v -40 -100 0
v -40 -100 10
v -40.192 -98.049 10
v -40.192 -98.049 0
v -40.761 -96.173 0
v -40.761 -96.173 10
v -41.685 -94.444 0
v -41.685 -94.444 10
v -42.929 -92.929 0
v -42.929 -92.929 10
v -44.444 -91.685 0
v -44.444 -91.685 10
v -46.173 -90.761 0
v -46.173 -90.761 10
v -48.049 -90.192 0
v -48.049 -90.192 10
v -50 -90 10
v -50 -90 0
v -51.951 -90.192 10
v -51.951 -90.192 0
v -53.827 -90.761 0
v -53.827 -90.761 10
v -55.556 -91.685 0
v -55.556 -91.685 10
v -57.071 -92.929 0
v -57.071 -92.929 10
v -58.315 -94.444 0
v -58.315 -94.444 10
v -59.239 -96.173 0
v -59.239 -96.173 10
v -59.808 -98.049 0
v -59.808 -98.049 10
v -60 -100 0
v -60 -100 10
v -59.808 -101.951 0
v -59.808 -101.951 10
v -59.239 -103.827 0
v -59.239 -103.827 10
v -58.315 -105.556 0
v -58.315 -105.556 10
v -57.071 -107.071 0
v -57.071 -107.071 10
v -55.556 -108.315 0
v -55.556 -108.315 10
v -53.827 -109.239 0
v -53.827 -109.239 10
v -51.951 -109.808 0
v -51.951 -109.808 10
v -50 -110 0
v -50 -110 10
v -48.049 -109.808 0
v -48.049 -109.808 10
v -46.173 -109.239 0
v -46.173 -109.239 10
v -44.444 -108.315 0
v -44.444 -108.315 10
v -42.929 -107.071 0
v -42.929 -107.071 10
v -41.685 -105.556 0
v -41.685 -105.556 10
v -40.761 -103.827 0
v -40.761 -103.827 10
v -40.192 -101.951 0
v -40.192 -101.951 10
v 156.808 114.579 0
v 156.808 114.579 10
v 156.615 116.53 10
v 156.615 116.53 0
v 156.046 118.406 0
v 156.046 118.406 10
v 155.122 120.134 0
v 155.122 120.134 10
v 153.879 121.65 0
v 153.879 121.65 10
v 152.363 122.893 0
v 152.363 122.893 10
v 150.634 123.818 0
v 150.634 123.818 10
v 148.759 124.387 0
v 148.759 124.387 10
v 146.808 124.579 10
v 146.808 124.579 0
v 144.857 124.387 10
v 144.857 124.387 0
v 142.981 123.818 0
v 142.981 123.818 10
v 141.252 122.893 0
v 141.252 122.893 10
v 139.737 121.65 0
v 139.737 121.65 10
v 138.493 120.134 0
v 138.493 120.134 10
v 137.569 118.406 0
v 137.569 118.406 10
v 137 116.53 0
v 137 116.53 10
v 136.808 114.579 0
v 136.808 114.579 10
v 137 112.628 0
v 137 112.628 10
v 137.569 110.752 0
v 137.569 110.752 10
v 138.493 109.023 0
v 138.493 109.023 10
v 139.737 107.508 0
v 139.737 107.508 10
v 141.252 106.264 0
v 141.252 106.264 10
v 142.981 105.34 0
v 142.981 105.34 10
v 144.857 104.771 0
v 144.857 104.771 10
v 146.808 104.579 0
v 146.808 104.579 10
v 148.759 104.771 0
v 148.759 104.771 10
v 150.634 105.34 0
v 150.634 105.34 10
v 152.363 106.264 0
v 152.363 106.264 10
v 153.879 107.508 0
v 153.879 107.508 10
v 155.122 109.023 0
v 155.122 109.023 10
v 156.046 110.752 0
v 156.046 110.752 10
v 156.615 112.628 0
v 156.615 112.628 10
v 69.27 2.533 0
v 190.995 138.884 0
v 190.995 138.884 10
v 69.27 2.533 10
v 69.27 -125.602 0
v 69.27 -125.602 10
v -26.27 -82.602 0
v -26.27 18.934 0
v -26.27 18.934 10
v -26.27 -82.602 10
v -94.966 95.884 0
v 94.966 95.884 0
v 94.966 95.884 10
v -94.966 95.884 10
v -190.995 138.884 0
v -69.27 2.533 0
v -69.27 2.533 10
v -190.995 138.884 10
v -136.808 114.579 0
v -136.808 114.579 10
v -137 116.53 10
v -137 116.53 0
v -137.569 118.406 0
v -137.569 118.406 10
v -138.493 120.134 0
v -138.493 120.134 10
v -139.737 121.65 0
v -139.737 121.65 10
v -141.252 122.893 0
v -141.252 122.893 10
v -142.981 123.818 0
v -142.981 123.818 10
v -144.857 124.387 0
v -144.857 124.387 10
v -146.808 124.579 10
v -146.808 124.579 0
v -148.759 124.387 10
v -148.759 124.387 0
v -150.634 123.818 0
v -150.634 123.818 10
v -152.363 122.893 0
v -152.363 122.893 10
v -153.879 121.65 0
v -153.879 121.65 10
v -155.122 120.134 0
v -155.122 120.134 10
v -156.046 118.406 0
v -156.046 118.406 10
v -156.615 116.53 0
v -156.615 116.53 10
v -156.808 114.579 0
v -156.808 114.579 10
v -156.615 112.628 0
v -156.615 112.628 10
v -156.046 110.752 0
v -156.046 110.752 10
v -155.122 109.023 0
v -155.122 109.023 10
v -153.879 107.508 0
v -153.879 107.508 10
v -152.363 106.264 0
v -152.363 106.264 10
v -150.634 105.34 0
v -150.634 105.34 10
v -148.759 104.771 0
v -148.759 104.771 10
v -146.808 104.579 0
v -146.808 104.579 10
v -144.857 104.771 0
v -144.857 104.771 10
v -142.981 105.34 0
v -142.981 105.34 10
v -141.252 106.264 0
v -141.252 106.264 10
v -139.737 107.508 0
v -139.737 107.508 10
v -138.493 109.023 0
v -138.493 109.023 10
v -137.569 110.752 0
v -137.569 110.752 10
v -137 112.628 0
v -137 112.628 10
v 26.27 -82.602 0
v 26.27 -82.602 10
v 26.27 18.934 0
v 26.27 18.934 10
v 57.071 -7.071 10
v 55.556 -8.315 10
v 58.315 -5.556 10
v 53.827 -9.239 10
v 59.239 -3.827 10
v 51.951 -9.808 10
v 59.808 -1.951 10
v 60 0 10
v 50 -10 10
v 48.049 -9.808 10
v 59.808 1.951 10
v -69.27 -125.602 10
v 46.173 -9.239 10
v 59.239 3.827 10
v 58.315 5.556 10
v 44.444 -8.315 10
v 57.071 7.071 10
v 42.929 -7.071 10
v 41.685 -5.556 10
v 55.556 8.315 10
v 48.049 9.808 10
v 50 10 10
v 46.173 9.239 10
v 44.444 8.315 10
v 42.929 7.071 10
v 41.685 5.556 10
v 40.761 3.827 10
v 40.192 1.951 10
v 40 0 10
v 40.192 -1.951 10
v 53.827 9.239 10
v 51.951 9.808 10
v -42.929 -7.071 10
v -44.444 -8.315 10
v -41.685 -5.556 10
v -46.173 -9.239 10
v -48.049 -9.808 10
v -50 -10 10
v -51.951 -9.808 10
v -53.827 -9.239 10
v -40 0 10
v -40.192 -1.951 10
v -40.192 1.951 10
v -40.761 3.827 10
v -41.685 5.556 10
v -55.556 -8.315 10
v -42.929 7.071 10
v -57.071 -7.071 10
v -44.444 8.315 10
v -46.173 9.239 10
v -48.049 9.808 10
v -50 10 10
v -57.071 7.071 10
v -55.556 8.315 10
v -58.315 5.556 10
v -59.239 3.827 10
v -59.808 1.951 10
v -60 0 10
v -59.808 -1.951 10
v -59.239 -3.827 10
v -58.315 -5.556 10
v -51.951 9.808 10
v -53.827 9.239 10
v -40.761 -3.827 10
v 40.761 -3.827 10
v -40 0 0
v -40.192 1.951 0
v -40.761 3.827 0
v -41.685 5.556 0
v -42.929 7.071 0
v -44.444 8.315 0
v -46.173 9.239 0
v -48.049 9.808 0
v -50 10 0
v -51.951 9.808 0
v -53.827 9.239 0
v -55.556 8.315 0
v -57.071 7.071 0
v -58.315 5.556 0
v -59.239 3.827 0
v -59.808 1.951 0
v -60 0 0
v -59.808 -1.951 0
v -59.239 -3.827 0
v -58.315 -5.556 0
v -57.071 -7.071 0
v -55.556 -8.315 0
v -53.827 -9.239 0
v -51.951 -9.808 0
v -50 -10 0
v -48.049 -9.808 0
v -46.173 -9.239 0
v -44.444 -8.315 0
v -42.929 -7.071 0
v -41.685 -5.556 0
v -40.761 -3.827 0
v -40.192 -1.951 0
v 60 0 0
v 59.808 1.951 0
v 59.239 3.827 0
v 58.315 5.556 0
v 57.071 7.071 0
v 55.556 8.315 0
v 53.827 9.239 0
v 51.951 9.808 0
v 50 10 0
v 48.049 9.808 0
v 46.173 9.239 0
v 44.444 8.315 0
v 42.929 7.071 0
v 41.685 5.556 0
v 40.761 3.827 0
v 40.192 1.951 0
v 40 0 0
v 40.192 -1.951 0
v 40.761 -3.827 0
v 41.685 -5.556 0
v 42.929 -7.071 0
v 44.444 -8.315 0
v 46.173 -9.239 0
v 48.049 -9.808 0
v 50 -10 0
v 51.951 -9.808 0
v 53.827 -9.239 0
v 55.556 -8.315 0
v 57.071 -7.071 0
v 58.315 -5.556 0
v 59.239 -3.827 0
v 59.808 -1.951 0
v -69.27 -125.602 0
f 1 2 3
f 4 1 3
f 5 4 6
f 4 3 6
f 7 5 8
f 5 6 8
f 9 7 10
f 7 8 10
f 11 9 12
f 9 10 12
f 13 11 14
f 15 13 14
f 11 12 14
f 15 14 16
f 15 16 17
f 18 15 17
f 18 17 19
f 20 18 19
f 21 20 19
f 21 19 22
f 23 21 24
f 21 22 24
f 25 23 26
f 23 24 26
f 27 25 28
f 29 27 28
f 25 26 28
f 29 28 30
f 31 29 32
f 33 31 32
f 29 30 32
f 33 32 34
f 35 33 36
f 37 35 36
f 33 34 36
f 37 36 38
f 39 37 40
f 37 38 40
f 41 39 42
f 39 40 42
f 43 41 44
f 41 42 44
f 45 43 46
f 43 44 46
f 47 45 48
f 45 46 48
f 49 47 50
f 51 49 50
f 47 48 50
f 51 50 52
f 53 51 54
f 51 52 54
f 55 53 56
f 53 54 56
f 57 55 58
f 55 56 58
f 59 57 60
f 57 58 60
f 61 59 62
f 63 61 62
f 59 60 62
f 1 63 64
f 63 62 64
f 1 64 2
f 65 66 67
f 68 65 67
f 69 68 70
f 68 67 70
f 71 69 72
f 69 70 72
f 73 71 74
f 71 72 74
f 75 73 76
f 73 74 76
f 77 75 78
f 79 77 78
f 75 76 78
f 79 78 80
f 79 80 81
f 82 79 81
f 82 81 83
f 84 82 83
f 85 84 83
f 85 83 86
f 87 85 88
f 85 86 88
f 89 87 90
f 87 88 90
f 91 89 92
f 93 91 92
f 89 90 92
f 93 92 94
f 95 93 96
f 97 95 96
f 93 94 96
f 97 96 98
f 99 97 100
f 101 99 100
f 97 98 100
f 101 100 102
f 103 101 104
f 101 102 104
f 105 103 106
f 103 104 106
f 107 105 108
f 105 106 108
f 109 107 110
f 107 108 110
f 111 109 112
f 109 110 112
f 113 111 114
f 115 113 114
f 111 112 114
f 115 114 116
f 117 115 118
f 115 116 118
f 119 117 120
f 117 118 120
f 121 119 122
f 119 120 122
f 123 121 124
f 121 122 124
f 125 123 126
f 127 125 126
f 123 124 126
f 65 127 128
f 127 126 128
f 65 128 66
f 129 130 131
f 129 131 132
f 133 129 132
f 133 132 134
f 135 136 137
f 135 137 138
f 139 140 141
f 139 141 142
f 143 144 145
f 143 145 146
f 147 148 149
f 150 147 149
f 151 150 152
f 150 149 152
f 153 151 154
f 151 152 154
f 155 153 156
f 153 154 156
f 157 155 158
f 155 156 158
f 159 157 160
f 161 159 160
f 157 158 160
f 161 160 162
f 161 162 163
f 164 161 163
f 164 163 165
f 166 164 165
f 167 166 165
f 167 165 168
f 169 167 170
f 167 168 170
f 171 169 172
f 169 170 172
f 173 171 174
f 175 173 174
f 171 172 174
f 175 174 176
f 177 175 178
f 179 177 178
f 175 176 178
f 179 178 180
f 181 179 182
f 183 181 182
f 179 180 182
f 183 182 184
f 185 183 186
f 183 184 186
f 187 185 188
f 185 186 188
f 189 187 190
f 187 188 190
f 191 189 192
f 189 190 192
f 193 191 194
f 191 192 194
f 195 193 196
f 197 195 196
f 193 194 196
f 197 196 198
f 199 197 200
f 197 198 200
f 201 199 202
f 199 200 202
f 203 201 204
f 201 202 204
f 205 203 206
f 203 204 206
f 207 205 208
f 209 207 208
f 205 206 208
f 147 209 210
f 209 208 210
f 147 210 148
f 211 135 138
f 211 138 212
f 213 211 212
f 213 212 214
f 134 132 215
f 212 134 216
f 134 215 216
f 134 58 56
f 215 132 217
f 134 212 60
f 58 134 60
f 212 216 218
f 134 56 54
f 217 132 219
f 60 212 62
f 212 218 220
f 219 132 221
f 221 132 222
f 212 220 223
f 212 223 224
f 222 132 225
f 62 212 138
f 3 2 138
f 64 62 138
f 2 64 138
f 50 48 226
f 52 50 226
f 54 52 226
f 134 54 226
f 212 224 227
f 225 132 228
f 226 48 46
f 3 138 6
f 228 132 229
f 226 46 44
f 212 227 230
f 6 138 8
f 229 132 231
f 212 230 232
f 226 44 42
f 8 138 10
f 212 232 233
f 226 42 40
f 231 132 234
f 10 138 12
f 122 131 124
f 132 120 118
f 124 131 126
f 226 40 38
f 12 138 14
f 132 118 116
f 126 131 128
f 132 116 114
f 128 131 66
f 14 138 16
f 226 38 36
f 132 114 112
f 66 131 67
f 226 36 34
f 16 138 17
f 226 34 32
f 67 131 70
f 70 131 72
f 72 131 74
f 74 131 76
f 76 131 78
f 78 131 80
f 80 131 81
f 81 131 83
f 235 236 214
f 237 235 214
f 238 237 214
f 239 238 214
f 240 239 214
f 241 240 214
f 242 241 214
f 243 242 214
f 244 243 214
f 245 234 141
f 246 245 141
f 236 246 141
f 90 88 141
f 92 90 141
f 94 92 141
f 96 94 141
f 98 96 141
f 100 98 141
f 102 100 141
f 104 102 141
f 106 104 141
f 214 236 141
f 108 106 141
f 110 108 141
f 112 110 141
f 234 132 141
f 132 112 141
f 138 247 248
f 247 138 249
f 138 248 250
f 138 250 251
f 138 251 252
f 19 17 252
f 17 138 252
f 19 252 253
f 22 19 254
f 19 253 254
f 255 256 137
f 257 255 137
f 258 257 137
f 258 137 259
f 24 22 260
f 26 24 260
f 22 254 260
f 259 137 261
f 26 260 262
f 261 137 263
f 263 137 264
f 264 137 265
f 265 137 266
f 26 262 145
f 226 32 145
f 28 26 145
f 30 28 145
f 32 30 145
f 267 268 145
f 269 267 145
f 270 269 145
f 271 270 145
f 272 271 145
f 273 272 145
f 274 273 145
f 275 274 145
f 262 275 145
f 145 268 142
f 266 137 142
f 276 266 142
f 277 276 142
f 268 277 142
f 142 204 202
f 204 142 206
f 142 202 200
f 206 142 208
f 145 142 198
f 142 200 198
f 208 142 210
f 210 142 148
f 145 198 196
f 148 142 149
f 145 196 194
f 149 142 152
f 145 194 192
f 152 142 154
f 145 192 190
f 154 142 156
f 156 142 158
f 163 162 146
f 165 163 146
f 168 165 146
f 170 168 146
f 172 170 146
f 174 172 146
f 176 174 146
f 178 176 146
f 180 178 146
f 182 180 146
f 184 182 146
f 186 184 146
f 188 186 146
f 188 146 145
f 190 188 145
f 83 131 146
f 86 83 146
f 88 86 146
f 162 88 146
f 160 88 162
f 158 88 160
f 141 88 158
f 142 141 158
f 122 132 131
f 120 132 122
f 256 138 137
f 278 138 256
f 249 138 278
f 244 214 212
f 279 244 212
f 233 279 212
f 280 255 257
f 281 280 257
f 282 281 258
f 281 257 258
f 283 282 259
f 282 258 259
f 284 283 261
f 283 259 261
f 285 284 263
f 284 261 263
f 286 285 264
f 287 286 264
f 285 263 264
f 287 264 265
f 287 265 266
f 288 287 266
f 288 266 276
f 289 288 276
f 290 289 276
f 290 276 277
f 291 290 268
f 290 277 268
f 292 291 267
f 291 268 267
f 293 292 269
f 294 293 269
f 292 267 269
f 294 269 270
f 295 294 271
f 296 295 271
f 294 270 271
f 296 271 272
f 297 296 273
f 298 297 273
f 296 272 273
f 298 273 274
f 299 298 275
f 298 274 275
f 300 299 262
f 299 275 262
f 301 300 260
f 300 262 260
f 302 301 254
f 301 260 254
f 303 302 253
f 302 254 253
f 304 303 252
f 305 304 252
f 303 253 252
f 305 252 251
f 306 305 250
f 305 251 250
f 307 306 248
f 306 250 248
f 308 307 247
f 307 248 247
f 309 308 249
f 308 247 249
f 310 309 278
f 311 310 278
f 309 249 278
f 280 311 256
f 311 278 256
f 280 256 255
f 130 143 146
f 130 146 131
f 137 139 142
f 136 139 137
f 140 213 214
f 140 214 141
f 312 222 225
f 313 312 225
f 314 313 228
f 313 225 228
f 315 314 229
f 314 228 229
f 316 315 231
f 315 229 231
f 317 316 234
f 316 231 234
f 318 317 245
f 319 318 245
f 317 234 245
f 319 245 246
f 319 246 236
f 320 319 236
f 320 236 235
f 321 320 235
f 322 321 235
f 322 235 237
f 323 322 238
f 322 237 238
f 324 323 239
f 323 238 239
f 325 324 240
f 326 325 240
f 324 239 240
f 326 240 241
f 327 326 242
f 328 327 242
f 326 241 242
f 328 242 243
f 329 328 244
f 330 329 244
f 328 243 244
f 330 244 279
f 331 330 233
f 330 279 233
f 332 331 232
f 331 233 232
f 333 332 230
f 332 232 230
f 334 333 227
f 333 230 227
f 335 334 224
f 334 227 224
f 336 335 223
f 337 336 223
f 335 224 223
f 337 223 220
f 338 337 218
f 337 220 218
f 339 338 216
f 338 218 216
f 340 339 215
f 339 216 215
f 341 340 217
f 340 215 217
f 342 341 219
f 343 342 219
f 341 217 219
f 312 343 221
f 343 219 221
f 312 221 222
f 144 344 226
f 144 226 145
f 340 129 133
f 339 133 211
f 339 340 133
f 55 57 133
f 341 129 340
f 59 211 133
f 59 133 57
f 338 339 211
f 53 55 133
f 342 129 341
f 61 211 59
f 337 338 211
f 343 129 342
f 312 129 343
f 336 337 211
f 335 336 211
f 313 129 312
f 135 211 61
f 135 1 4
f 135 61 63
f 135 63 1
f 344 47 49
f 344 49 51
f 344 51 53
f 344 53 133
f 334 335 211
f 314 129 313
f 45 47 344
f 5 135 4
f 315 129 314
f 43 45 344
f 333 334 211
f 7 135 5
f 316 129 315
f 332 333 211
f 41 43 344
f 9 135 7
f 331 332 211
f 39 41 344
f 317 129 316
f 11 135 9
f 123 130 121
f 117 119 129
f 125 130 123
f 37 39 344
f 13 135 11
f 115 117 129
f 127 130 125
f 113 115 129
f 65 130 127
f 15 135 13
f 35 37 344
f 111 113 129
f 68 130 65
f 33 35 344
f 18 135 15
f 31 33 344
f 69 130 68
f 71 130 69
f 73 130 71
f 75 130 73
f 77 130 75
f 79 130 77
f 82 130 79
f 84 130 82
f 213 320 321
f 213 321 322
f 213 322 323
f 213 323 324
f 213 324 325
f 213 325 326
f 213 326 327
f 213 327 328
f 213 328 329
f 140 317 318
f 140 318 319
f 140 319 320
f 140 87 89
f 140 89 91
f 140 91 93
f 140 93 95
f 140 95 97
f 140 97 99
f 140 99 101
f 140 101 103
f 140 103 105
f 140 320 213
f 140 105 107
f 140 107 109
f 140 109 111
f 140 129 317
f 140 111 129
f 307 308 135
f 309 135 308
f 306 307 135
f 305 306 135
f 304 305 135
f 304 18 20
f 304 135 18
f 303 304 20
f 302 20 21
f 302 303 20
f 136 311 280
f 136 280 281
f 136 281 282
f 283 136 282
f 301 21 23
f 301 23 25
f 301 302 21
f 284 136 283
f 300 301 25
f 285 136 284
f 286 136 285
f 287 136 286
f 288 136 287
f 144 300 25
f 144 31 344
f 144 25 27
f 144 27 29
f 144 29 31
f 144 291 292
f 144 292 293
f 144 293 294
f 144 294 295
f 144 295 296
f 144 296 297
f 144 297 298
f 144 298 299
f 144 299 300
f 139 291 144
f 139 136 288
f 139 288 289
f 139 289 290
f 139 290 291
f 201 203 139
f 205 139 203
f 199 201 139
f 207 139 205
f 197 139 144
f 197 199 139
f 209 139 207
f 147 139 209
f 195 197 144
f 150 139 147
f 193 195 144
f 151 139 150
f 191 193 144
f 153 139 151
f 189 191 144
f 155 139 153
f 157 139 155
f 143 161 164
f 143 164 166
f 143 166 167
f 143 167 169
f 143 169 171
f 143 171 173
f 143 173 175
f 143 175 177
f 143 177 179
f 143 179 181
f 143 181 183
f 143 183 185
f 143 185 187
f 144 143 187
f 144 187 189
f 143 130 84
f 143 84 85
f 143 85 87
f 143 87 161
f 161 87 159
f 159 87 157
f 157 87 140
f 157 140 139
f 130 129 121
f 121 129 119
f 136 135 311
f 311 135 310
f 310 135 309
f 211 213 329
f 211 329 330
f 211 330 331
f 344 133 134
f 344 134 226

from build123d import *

# Parameters (mm, degrees)
EXTRUDE_2_DEPTH     = 10
SKETCH_6_R          = 10
CUT_EXTRUDE_2_DEPTH = 10


with BuildPart() as part:
    # Эскиз5 → Бобышка-Вытянуть2 (new body)
    with BuildSketch(Plane.XY):
        Polygon((69.270264014, 2.532805315), (69.270264014, -125.60178411), (-69.270264014, -125.60178411), (-69.270264014, 2.532805315), (-190.995381487, 138.884340659), (190.995381487, 138.884340659), align=None)
        Polygon((-26.270264014, -82.60178411), (26.270264014, -82.60178411), (26.270264014, 18.934099876), (94.96605886, 95.884340659), (-94.96605886, 95.884340659), (-26.270264014, 18.934099876), align=None, mode=Mode.SUBTRACT)
    extrude(amount=EXTRUDE_2_DEPTH)

    # Эскиз6 → Вырез-Вытянуть2 (cut)
    with BuildSketch(Plane.XY.offset(10)):
        with Locations((-146.807623039, 114.578724559)):
            Circle(SKETCH_6_R)
        with Locations((146.807623039, 114.578724559)):
            Circle(SKETCH_6_R)
        with Locations((-50, 0)):
            Circle(SKETCH_6_R)
        with Locations((-50, -100)):
            Circle(SKETCH_6_R)
        with Locations((50, 0)):
            Circle(SKETCH_6_R)
    extrude(amount=-CUT_EXTRUDE_2_DEPTH, mode=Mode.SUBTRACT)


solid = part.part
